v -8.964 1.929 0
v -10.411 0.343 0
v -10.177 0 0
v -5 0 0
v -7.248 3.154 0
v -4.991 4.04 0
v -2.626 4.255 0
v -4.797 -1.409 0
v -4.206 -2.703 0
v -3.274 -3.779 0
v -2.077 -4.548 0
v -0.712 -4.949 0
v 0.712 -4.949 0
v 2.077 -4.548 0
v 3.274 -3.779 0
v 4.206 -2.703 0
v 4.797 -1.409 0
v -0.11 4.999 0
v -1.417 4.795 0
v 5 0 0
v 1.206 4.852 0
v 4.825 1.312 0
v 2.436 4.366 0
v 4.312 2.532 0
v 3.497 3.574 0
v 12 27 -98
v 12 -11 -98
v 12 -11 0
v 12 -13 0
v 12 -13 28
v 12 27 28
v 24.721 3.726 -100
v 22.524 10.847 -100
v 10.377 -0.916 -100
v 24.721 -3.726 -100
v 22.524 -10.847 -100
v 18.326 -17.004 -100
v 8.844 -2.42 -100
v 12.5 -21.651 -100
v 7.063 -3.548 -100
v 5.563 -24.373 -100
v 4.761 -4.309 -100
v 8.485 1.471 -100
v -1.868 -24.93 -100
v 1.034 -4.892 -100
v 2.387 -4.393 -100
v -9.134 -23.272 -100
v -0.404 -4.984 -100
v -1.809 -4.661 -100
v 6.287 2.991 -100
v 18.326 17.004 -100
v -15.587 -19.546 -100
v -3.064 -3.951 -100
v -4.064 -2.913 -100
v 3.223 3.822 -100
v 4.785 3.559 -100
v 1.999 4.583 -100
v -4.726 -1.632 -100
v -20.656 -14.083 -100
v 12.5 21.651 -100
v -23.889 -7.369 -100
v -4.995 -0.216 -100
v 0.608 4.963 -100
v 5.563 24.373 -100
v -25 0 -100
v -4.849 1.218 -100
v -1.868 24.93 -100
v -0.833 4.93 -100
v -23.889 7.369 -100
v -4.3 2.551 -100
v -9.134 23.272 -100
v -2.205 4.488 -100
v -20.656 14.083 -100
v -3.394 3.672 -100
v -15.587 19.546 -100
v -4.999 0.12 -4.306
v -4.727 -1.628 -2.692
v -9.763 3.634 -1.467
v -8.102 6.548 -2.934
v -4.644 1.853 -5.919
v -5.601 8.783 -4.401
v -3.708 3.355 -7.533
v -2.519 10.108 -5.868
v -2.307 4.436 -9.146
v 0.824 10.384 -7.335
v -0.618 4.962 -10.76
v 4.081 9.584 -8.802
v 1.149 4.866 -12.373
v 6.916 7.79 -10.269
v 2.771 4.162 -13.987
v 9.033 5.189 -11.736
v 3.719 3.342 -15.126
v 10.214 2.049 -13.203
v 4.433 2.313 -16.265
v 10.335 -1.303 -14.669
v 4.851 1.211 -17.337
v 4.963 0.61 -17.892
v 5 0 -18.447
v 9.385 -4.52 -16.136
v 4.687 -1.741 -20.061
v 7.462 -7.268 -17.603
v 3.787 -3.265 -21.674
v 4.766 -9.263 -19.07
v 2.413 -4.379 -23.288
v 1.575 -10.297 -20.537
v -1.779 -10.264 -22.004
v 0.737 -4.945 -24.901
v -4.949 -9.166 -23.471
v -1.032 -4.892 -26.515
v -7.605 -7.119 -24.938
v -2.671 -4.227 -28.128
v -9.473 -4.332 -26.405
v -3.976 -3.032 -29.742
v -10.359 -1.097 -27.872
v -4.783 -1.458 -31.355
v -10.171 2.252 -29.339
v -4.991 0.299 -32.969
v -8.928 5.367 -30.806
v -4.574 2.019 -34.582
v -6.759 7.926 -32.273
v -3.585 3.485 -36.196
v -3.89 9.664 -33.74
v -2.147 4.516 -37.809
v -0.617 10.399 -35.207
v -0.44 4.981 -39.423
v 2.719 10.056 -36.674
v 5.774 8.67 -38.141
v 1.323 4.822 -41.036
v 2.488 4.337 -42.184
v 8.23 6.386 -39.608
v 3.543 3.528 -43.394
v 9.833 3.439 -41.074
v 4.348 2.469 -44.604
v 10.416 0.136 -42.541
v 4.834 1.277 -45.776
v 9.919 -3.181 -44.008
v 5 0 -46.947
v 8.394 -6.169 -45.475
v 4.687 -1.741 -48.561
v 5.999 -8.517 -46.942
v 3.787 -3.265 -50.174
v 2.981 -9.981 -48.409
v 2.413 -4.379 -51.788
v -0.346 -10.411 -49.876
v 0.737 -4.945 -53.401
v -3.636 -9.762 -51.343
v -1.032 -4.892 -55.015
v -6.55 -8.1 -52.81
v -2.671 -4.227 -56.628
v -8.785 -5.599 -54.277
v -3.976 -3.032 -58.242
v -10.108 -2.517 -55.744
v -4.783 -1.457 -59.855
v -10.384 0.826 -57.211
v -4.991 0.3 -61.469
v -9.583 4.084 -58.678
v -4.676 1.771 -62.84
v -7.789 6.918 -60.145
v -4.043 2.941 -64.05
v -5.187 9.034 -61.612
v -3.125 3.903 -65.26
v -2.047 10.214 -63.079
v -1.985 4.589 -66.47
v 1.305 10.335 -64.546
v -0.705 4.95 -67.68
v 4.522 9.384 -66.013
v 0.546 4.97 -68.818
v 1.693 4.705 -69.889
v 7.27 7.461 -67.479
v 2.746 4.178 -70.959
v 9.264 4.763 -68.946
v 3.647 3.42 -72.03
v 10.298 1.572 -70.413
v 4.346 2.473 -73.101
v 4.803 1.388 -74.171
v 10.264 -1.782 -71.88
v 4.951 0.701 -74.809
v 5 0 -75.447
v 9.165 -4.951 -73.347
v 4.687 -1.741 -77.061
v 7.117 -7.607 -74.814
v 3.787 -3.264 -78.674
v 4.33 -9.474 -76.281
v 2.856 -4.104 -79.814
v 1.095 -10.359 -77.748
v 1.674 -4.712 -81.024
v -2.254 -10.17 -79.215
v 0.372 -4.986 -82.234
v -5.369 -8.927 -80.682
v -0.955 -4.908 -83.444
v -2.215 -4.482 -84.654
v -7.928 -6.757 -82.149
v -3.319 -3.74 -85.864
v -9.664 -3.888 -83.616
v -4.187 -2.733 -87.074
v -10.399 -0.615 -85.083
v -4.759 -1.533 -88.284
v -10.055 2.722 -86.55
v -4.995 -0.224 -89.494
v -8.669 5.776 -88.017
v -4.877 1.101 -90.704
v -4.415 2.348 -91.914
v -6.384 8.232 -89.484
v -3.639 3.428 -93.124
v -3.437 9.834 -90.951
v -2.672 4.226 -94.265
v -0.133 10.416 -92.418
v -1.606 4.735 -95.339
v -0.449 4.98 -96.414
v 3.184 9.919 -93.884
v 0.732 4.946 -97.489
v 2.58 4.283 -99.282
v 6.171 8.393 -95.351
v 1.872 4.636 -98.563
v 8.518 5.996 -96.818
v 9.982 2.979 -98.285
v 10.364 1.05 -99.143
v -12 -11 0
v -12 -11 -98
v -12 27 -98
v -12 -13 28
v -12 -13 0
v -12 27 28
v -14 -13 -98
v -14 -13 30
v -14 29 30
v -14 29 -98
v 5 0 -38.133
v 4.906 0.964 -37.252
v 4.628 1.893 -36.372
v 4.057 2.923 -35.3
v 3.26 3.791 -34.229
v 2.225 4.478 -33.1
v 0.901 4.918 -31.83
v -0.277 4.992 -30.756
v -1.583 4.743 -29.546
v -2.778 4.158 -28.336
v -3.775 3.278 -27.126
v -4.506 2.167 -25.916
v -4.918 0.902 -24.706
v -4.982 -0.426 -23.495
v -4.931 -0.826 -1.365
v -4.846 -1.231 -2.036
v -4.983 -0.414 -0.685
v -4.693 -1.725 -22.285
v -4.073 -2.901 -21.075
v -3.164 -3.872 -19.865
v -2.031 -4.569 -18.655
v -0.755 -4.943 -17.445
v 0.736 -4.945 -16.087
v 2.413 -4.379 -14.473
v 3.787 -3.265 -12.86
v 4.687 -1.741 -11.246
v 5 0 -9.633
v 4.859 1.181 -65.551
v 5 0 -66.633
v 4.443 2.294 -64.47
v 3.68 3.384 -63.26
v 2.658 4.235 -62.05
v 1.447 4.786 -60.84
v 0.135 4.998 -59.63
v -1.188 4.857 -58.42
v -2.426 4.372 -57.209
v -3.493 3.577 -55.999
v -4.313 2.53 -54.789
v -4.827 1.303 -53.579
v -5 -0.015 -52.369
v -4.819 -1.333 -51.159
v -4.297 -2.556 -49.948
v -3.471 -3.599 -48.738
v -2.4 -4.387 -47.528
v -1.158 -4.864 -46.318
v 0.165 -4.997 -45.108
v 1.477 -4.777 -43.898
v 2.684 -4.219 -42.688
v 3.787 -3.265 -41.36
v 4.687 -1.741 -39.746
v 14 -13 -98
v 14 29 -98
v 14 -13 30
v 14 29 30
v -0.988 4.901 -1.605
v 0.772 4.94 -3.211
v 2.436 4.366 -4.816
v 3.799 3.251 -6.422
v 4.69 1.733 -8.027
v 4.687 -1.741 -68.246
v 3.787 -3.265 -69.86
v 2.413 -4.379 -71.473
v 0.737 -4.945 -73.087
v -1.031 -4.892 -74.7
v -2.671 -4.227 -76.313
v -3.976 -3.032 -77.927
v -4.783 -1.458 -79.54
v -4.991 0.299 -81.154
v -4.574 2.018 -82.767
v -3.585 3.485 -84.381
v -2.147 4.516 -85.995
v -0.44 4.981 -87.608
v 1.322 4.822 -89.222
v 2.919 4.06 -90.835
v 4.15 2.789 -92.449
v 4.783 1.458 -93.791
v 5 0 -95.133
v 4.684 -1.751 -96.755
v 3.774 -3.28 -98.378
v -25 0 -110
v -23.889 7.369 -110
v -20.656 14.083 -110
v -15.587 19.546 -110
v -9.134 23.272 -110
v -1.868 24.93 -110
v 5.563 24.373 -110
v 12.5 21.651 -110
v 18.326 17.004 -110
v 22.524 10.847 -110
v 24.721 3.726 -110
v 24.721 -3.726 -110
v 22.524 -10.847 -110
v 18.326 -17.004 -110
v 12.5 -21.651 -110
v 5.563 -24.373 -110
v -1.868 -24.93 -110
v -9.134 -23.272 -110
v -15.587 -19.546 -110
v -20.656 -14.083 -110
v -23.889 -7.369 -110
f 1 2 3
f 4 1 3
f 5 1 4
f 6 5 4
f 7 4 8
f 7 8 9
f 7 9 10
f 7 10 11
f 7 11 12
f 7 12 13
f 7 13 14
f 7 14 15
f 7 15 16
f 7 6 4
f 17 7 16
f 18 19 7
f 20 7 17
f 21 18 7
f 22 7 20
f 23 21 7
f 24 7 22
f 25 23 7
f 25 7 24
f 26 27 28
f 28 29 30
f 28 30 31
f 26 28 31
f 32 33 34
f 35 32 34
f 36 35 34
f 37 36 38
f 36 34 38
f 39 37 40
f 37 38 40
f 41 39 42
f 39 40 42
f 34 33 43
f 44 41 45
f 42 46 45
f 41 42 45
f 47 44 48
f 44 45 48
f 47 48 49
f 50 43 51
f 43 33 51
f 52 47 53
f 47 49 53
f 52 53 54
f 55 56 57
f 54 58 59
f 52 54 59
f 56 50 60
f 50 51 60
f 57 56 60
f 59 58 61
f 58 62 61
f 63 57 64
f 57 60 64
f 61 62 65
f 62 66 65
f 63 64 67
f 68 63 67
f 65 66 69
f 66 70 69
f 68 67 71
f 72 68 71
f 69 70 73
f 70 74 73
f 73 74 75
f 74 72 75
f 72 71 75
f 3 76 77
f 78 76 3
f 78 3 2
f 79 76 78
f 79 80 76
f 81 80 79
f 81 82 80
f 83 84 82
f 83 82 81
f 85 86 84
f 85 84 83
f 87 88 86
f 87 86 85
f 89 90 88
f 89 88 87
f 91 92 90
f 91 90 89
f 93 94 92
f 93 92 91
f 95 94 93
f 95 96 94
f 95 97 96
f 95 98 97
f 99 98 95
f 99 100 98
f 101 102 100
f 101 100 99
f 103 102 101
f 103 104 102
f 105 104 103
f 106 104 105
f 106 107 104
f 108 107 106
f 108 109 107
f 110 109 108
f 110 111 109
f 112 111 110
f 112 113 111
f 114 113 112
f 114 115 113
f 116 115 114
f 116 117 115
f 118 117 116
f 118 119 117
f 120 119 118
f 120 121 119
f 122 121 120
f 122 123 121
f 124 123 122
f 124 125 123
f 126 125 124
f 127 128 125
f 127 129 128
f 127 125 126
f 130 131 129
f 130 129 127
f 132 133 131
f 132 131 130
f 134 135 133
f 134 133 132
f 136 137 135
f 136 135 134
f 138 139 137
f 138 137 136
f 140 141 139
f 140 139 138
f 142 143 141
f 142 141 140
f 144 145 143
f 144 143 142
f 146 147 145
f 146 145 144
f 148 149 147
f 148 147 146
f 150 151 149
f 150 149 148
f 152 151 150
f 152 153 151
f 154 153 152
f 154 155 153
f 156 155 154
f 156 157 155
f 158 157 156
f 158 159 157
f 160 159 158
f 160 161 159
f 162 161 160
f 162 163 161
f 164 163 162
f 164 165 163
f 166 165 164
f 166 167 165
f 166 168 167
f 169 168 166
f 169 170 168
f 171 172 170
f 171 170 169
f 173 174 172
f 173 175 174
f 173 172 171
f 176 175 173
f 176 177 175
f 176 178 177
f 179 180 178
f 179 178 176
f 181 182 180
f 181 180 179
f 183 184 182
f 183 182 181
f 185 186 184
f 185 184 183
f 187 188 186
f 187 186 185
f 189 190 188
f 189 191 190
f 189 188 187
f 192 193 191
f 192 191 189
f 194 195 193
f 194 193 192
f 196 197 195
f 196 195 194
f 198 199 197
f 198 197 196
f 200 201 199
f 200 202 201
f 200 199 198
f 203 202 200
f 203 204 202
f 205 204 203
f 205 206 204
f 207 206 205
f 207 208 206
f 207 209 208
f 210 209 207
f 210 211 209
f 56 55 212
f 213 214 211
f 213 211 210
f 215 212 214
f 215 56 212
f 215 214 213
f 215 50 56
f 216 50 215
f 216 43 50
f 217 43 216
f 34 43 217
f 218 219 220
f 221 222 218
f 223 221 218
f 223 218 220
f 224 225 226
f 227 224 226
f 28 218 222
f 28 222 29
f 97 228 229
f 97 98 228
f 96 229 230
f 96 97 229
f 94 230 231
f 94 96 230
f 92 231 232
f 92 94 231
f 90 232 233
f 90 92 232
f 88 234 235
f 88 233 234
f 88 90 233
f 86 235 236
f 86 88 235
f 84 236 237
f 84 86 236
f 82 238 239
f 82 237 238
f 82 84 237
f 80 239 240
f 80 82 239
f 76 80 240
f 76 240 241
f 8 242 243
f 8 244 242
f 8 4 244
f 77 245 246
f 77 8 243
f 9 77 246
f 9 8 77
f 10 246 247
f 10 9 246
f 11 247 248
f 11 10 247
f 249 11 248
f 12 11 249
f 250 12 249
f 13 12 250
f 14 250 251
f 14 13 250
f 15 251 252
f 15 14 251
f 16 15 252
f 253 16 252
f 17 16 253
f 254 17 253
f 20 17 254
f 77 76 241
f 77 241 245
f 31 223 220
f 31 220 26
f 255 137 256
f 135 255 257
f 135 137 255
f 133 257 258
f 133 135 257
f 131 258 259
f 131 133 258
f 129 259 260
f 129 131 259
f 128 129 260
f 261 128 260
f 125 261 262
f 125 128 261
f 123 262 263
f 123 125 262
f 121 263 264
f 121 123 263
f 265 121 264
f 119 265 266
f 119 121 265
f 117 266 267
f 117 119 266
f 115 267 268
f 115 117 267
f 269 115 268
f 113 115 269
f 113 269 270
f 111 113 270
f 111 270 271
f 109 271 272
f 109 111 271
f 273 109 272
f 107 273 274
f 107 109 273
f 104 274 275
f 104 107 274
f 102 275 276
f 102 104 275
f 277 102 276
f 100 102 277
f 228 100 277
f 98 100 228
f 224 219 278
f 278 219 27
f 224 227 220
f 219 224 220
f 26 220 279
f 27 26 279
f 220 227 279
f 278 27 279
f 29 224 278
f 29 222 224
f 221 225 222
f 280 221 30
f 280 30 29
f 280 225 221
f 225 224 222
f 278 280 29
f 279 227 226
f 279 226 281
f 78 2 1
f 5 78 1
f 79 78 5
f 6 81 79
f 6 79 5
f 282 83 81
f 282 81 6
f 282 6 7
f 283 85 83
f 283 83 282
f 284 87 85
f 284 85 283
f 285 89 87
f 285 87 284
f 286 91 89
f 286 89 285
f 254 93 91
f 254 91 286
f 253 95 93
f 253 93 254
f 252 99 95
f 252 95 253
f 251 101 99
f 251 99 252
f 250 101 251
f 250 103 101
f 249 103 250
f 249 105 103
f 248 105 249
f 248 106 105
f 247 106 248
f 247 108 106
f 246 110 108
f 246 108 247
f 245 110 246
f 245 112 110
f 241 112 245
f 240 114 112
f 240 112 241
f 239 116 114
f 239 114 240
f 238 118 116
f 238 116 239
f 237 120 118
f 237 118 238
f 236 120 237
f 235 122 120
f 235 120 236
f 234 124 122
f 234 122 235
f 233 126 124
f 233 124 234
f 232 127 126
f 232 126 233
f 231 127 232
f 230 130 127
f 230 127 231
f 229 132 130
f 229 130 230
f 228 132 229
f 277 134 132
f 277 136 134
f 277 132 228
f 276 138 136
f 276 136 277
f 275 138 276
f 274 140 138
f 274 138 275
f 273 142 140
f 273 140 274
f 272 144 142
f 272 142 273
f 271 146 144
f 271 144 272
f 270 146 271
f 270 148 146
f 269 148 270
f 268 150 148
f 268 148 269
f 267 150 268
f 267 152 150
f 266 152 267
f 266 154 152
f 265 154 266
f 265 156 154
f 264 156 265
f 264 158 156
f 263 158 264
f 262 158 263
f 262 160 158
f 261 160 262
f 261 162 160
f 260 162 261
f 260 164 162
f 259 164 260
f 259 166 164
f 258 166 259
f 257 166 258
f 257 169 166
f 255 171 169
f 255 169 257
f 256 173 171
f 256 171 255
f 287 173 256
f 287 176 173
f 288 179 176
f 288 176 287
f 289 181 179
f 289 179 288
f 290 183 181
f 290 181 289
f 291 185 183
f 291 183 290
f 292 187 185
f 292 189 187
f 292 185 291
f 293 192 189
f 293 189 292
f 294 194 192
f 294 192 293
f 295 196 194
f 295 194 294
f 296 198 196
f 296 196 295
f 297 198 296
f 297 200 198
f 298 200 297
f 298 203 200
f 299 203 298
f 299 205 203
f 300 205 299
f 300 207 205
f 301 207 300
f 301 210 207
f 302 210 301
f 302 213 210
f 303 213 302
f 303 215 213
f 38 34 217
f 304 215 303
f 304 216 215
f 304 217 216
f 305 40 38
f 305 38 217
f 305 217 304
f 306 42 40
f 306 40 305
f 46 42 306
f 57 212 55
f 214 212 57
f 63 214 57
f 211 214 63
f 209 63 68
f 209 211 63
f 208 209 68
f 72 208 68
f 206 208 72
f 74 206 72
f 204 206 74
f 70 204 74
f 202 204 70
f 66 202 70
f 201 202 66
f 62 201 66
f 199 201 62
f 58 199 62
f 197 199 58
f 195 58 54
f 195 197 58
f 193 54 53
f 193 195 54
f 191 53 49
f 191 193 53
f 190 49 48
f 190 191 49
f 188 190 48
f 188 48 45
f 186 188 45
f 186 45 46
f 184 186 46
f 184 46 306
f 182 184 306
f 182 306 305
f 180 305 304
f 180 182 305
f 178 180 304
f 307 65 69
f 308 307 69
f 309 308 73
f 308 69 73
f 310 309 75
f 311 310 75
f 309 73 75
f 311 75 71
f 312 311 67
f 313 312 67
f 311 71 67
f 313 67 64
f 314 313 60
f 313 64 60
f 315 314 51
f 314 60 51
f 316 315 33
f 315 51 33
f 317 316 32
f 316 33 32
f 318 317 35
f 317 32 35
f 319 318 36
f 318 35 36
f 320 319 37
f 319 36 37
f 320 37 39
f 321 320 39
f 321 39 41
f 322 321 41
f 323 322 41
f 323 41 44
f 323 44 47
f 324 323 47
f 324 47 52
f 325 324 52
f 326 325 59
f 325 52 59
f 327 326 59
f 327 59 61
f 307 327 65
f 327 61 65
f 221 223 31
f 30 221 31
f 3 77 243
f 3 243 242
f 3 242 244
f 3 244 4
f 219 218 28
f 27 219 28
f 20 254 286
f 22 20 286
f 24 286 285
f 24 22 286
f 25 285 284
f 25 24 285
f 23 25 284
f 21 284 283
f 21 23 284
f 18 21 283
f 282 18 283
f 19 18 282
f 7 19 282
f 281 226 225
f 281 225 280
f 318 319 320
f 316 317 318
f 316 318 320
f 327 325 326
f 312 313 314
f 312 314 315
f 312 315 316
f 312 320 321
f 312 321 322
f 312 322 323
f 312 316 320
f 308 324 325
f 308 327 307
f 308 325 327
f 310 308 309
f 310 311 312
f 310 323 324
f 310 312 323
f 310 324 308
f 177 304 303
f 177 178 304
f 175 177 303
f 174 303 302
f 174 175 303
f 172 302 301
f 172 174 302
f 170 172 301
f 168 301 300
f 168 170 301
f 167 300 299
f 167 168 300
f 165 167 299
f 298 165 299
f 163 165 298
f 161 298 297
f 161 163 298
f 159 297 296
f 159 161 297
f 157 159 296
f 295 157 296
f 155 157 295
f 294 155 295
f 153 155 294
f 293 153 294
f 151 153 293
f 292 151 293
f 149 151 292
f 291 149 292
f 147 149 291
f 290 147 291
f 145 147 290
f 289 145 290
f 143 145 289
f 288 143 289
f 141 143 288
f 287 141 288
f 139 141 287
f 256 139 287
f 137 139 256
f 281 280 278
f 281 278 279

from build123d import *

# Parameters (mm, degrees)
SKETCH1_R           = 5
BODY_DEPTH          = 100
SKETCH2_R           = 25
HEAD_DEPTH          = 10
SWEEP1_PITCH        = 28.5
SWEEP1_HEIGHT       = 105
SWEEP1_RADIUS       = 7.5
SKETCH18_R          = 14.102018713
CUT_EXTRUDE1_DEPTH  = 17
SKETCH19_W          = 28
SKETCH19_H          = 42
SKETCH19_W_2        = 24
SKETCH19_H_2        = 38
FRAME_DEPTH         = 128
SKETCH19_2_W        = 24
SKETCH19_2_H        = 38
BOSS_EXTRUDE3_DEPTH = 2
SKETCH23_W          = 24
SKETCH23_H          = 28
HOLE_DEPTH          = 2
SKETCH23_3_W        = 24
SKETCH23_3_H        = 28
CUT_EXTRUDE2_DEPTH  = 2


with BuildPart() as part:
    # Sketch1 → Body (new body)
    with BuildSketch(Plane.XY):
        Circle(SKETCH1_R)
    extrude(amount=-BODY_DEPTH)

    # Sketch2 → Head (add)
    with BuildSketch(Plane(origin=(0, 0, -100), x_dir=(-1, 0, 0), z_dir=(0, 0, -1))):
        Circle(SKETCH2_R)
    extrude(amount=HEAD_DEPTH)

    # Sweep1: sweep along a helix
    with BuildLine() as sweep1_path:
        Helix(SWEEP1_PITCH, SWEEP1_HEIGHT, SWEEP1_RADIUS, center=(0, 0, 0), direction=(0, 0, -1))
    # Sketch17 → Sweep1 (sweep)
    with BuildSketch(Plane(origin=(-7.5, 0, 0), x_dir=(1, 0, 0), z_dir=(-5.979636411115962e-15, 0.8556798386028079, -0.5175055688673048))):
        Polygon((-2.916813088, -0.138186574), (3.083186912, -3.602288189), (3.083186912, 3.325915041), align=None)
    sweep(path=sweep1_path.line, is_frenet=True)

    # Sketch18 → Cut-Extrude1 (cut)
    with BuildSketch(Plane.XY):
        Circle(SKETCH18_R)
    extrude(amount=CUT_EXTRUDE1_DEPTH, mode=Mode.SUBTRACT)


with BuildPart() as body_2:
    # Sketch19 → Frame (new body)
    with BuildSketch(Plane.XY.offset(30)):
        with Locations((0, 8)):
            Rectangle(SKETCH19_W, SKETCH19_H)
        with Locations((0, 8)):
            Rectangle(SKETCH19_W_2, SKETCH19_H_2, mode=Mode.SUBTRACT)
    extrude(amount=-FRAME_DEPTH)

    # Sketch19<2> → Boss-Extrude3 (add)
    with BuildSketch(Plane.XY.offset(30)):
        with Locations((0, 8)):
            Rectangle(SKETCH19_2_W, SKETCH19_2_H)
    extrude(amount=-BOSS_EXTRUDE3_DEPTH)

    # Sketch23 → Hole (add)
    with BuildSketch(Plane(origin=(0, -11, 0), x_dir=(1, 0, 0), z_dir=(0, 1, 0))):
        with Locations((0, -14)):
            Rectangle(SKETCH23_W, SKETCH23_H)
    extrude(amount=-HOLE_DEPTH)

    # Sketch23<3> → Cut-Extrude2 (cut)
    with BuildSketch(Plane(origin=(0, -11, 0), x_dir=(1, 0, 0), z_dir=(0, 1, 0))):
        with Locations((0, -14)):
            Rectangle(SKETCH23_3_W, SKETCH23_3_H)
    extrude(amount=-CUT_EXTRUDE2_DEPTH, mode=Mode.SUBTRACT)


solid = Compound([part.part, body_2.part])
